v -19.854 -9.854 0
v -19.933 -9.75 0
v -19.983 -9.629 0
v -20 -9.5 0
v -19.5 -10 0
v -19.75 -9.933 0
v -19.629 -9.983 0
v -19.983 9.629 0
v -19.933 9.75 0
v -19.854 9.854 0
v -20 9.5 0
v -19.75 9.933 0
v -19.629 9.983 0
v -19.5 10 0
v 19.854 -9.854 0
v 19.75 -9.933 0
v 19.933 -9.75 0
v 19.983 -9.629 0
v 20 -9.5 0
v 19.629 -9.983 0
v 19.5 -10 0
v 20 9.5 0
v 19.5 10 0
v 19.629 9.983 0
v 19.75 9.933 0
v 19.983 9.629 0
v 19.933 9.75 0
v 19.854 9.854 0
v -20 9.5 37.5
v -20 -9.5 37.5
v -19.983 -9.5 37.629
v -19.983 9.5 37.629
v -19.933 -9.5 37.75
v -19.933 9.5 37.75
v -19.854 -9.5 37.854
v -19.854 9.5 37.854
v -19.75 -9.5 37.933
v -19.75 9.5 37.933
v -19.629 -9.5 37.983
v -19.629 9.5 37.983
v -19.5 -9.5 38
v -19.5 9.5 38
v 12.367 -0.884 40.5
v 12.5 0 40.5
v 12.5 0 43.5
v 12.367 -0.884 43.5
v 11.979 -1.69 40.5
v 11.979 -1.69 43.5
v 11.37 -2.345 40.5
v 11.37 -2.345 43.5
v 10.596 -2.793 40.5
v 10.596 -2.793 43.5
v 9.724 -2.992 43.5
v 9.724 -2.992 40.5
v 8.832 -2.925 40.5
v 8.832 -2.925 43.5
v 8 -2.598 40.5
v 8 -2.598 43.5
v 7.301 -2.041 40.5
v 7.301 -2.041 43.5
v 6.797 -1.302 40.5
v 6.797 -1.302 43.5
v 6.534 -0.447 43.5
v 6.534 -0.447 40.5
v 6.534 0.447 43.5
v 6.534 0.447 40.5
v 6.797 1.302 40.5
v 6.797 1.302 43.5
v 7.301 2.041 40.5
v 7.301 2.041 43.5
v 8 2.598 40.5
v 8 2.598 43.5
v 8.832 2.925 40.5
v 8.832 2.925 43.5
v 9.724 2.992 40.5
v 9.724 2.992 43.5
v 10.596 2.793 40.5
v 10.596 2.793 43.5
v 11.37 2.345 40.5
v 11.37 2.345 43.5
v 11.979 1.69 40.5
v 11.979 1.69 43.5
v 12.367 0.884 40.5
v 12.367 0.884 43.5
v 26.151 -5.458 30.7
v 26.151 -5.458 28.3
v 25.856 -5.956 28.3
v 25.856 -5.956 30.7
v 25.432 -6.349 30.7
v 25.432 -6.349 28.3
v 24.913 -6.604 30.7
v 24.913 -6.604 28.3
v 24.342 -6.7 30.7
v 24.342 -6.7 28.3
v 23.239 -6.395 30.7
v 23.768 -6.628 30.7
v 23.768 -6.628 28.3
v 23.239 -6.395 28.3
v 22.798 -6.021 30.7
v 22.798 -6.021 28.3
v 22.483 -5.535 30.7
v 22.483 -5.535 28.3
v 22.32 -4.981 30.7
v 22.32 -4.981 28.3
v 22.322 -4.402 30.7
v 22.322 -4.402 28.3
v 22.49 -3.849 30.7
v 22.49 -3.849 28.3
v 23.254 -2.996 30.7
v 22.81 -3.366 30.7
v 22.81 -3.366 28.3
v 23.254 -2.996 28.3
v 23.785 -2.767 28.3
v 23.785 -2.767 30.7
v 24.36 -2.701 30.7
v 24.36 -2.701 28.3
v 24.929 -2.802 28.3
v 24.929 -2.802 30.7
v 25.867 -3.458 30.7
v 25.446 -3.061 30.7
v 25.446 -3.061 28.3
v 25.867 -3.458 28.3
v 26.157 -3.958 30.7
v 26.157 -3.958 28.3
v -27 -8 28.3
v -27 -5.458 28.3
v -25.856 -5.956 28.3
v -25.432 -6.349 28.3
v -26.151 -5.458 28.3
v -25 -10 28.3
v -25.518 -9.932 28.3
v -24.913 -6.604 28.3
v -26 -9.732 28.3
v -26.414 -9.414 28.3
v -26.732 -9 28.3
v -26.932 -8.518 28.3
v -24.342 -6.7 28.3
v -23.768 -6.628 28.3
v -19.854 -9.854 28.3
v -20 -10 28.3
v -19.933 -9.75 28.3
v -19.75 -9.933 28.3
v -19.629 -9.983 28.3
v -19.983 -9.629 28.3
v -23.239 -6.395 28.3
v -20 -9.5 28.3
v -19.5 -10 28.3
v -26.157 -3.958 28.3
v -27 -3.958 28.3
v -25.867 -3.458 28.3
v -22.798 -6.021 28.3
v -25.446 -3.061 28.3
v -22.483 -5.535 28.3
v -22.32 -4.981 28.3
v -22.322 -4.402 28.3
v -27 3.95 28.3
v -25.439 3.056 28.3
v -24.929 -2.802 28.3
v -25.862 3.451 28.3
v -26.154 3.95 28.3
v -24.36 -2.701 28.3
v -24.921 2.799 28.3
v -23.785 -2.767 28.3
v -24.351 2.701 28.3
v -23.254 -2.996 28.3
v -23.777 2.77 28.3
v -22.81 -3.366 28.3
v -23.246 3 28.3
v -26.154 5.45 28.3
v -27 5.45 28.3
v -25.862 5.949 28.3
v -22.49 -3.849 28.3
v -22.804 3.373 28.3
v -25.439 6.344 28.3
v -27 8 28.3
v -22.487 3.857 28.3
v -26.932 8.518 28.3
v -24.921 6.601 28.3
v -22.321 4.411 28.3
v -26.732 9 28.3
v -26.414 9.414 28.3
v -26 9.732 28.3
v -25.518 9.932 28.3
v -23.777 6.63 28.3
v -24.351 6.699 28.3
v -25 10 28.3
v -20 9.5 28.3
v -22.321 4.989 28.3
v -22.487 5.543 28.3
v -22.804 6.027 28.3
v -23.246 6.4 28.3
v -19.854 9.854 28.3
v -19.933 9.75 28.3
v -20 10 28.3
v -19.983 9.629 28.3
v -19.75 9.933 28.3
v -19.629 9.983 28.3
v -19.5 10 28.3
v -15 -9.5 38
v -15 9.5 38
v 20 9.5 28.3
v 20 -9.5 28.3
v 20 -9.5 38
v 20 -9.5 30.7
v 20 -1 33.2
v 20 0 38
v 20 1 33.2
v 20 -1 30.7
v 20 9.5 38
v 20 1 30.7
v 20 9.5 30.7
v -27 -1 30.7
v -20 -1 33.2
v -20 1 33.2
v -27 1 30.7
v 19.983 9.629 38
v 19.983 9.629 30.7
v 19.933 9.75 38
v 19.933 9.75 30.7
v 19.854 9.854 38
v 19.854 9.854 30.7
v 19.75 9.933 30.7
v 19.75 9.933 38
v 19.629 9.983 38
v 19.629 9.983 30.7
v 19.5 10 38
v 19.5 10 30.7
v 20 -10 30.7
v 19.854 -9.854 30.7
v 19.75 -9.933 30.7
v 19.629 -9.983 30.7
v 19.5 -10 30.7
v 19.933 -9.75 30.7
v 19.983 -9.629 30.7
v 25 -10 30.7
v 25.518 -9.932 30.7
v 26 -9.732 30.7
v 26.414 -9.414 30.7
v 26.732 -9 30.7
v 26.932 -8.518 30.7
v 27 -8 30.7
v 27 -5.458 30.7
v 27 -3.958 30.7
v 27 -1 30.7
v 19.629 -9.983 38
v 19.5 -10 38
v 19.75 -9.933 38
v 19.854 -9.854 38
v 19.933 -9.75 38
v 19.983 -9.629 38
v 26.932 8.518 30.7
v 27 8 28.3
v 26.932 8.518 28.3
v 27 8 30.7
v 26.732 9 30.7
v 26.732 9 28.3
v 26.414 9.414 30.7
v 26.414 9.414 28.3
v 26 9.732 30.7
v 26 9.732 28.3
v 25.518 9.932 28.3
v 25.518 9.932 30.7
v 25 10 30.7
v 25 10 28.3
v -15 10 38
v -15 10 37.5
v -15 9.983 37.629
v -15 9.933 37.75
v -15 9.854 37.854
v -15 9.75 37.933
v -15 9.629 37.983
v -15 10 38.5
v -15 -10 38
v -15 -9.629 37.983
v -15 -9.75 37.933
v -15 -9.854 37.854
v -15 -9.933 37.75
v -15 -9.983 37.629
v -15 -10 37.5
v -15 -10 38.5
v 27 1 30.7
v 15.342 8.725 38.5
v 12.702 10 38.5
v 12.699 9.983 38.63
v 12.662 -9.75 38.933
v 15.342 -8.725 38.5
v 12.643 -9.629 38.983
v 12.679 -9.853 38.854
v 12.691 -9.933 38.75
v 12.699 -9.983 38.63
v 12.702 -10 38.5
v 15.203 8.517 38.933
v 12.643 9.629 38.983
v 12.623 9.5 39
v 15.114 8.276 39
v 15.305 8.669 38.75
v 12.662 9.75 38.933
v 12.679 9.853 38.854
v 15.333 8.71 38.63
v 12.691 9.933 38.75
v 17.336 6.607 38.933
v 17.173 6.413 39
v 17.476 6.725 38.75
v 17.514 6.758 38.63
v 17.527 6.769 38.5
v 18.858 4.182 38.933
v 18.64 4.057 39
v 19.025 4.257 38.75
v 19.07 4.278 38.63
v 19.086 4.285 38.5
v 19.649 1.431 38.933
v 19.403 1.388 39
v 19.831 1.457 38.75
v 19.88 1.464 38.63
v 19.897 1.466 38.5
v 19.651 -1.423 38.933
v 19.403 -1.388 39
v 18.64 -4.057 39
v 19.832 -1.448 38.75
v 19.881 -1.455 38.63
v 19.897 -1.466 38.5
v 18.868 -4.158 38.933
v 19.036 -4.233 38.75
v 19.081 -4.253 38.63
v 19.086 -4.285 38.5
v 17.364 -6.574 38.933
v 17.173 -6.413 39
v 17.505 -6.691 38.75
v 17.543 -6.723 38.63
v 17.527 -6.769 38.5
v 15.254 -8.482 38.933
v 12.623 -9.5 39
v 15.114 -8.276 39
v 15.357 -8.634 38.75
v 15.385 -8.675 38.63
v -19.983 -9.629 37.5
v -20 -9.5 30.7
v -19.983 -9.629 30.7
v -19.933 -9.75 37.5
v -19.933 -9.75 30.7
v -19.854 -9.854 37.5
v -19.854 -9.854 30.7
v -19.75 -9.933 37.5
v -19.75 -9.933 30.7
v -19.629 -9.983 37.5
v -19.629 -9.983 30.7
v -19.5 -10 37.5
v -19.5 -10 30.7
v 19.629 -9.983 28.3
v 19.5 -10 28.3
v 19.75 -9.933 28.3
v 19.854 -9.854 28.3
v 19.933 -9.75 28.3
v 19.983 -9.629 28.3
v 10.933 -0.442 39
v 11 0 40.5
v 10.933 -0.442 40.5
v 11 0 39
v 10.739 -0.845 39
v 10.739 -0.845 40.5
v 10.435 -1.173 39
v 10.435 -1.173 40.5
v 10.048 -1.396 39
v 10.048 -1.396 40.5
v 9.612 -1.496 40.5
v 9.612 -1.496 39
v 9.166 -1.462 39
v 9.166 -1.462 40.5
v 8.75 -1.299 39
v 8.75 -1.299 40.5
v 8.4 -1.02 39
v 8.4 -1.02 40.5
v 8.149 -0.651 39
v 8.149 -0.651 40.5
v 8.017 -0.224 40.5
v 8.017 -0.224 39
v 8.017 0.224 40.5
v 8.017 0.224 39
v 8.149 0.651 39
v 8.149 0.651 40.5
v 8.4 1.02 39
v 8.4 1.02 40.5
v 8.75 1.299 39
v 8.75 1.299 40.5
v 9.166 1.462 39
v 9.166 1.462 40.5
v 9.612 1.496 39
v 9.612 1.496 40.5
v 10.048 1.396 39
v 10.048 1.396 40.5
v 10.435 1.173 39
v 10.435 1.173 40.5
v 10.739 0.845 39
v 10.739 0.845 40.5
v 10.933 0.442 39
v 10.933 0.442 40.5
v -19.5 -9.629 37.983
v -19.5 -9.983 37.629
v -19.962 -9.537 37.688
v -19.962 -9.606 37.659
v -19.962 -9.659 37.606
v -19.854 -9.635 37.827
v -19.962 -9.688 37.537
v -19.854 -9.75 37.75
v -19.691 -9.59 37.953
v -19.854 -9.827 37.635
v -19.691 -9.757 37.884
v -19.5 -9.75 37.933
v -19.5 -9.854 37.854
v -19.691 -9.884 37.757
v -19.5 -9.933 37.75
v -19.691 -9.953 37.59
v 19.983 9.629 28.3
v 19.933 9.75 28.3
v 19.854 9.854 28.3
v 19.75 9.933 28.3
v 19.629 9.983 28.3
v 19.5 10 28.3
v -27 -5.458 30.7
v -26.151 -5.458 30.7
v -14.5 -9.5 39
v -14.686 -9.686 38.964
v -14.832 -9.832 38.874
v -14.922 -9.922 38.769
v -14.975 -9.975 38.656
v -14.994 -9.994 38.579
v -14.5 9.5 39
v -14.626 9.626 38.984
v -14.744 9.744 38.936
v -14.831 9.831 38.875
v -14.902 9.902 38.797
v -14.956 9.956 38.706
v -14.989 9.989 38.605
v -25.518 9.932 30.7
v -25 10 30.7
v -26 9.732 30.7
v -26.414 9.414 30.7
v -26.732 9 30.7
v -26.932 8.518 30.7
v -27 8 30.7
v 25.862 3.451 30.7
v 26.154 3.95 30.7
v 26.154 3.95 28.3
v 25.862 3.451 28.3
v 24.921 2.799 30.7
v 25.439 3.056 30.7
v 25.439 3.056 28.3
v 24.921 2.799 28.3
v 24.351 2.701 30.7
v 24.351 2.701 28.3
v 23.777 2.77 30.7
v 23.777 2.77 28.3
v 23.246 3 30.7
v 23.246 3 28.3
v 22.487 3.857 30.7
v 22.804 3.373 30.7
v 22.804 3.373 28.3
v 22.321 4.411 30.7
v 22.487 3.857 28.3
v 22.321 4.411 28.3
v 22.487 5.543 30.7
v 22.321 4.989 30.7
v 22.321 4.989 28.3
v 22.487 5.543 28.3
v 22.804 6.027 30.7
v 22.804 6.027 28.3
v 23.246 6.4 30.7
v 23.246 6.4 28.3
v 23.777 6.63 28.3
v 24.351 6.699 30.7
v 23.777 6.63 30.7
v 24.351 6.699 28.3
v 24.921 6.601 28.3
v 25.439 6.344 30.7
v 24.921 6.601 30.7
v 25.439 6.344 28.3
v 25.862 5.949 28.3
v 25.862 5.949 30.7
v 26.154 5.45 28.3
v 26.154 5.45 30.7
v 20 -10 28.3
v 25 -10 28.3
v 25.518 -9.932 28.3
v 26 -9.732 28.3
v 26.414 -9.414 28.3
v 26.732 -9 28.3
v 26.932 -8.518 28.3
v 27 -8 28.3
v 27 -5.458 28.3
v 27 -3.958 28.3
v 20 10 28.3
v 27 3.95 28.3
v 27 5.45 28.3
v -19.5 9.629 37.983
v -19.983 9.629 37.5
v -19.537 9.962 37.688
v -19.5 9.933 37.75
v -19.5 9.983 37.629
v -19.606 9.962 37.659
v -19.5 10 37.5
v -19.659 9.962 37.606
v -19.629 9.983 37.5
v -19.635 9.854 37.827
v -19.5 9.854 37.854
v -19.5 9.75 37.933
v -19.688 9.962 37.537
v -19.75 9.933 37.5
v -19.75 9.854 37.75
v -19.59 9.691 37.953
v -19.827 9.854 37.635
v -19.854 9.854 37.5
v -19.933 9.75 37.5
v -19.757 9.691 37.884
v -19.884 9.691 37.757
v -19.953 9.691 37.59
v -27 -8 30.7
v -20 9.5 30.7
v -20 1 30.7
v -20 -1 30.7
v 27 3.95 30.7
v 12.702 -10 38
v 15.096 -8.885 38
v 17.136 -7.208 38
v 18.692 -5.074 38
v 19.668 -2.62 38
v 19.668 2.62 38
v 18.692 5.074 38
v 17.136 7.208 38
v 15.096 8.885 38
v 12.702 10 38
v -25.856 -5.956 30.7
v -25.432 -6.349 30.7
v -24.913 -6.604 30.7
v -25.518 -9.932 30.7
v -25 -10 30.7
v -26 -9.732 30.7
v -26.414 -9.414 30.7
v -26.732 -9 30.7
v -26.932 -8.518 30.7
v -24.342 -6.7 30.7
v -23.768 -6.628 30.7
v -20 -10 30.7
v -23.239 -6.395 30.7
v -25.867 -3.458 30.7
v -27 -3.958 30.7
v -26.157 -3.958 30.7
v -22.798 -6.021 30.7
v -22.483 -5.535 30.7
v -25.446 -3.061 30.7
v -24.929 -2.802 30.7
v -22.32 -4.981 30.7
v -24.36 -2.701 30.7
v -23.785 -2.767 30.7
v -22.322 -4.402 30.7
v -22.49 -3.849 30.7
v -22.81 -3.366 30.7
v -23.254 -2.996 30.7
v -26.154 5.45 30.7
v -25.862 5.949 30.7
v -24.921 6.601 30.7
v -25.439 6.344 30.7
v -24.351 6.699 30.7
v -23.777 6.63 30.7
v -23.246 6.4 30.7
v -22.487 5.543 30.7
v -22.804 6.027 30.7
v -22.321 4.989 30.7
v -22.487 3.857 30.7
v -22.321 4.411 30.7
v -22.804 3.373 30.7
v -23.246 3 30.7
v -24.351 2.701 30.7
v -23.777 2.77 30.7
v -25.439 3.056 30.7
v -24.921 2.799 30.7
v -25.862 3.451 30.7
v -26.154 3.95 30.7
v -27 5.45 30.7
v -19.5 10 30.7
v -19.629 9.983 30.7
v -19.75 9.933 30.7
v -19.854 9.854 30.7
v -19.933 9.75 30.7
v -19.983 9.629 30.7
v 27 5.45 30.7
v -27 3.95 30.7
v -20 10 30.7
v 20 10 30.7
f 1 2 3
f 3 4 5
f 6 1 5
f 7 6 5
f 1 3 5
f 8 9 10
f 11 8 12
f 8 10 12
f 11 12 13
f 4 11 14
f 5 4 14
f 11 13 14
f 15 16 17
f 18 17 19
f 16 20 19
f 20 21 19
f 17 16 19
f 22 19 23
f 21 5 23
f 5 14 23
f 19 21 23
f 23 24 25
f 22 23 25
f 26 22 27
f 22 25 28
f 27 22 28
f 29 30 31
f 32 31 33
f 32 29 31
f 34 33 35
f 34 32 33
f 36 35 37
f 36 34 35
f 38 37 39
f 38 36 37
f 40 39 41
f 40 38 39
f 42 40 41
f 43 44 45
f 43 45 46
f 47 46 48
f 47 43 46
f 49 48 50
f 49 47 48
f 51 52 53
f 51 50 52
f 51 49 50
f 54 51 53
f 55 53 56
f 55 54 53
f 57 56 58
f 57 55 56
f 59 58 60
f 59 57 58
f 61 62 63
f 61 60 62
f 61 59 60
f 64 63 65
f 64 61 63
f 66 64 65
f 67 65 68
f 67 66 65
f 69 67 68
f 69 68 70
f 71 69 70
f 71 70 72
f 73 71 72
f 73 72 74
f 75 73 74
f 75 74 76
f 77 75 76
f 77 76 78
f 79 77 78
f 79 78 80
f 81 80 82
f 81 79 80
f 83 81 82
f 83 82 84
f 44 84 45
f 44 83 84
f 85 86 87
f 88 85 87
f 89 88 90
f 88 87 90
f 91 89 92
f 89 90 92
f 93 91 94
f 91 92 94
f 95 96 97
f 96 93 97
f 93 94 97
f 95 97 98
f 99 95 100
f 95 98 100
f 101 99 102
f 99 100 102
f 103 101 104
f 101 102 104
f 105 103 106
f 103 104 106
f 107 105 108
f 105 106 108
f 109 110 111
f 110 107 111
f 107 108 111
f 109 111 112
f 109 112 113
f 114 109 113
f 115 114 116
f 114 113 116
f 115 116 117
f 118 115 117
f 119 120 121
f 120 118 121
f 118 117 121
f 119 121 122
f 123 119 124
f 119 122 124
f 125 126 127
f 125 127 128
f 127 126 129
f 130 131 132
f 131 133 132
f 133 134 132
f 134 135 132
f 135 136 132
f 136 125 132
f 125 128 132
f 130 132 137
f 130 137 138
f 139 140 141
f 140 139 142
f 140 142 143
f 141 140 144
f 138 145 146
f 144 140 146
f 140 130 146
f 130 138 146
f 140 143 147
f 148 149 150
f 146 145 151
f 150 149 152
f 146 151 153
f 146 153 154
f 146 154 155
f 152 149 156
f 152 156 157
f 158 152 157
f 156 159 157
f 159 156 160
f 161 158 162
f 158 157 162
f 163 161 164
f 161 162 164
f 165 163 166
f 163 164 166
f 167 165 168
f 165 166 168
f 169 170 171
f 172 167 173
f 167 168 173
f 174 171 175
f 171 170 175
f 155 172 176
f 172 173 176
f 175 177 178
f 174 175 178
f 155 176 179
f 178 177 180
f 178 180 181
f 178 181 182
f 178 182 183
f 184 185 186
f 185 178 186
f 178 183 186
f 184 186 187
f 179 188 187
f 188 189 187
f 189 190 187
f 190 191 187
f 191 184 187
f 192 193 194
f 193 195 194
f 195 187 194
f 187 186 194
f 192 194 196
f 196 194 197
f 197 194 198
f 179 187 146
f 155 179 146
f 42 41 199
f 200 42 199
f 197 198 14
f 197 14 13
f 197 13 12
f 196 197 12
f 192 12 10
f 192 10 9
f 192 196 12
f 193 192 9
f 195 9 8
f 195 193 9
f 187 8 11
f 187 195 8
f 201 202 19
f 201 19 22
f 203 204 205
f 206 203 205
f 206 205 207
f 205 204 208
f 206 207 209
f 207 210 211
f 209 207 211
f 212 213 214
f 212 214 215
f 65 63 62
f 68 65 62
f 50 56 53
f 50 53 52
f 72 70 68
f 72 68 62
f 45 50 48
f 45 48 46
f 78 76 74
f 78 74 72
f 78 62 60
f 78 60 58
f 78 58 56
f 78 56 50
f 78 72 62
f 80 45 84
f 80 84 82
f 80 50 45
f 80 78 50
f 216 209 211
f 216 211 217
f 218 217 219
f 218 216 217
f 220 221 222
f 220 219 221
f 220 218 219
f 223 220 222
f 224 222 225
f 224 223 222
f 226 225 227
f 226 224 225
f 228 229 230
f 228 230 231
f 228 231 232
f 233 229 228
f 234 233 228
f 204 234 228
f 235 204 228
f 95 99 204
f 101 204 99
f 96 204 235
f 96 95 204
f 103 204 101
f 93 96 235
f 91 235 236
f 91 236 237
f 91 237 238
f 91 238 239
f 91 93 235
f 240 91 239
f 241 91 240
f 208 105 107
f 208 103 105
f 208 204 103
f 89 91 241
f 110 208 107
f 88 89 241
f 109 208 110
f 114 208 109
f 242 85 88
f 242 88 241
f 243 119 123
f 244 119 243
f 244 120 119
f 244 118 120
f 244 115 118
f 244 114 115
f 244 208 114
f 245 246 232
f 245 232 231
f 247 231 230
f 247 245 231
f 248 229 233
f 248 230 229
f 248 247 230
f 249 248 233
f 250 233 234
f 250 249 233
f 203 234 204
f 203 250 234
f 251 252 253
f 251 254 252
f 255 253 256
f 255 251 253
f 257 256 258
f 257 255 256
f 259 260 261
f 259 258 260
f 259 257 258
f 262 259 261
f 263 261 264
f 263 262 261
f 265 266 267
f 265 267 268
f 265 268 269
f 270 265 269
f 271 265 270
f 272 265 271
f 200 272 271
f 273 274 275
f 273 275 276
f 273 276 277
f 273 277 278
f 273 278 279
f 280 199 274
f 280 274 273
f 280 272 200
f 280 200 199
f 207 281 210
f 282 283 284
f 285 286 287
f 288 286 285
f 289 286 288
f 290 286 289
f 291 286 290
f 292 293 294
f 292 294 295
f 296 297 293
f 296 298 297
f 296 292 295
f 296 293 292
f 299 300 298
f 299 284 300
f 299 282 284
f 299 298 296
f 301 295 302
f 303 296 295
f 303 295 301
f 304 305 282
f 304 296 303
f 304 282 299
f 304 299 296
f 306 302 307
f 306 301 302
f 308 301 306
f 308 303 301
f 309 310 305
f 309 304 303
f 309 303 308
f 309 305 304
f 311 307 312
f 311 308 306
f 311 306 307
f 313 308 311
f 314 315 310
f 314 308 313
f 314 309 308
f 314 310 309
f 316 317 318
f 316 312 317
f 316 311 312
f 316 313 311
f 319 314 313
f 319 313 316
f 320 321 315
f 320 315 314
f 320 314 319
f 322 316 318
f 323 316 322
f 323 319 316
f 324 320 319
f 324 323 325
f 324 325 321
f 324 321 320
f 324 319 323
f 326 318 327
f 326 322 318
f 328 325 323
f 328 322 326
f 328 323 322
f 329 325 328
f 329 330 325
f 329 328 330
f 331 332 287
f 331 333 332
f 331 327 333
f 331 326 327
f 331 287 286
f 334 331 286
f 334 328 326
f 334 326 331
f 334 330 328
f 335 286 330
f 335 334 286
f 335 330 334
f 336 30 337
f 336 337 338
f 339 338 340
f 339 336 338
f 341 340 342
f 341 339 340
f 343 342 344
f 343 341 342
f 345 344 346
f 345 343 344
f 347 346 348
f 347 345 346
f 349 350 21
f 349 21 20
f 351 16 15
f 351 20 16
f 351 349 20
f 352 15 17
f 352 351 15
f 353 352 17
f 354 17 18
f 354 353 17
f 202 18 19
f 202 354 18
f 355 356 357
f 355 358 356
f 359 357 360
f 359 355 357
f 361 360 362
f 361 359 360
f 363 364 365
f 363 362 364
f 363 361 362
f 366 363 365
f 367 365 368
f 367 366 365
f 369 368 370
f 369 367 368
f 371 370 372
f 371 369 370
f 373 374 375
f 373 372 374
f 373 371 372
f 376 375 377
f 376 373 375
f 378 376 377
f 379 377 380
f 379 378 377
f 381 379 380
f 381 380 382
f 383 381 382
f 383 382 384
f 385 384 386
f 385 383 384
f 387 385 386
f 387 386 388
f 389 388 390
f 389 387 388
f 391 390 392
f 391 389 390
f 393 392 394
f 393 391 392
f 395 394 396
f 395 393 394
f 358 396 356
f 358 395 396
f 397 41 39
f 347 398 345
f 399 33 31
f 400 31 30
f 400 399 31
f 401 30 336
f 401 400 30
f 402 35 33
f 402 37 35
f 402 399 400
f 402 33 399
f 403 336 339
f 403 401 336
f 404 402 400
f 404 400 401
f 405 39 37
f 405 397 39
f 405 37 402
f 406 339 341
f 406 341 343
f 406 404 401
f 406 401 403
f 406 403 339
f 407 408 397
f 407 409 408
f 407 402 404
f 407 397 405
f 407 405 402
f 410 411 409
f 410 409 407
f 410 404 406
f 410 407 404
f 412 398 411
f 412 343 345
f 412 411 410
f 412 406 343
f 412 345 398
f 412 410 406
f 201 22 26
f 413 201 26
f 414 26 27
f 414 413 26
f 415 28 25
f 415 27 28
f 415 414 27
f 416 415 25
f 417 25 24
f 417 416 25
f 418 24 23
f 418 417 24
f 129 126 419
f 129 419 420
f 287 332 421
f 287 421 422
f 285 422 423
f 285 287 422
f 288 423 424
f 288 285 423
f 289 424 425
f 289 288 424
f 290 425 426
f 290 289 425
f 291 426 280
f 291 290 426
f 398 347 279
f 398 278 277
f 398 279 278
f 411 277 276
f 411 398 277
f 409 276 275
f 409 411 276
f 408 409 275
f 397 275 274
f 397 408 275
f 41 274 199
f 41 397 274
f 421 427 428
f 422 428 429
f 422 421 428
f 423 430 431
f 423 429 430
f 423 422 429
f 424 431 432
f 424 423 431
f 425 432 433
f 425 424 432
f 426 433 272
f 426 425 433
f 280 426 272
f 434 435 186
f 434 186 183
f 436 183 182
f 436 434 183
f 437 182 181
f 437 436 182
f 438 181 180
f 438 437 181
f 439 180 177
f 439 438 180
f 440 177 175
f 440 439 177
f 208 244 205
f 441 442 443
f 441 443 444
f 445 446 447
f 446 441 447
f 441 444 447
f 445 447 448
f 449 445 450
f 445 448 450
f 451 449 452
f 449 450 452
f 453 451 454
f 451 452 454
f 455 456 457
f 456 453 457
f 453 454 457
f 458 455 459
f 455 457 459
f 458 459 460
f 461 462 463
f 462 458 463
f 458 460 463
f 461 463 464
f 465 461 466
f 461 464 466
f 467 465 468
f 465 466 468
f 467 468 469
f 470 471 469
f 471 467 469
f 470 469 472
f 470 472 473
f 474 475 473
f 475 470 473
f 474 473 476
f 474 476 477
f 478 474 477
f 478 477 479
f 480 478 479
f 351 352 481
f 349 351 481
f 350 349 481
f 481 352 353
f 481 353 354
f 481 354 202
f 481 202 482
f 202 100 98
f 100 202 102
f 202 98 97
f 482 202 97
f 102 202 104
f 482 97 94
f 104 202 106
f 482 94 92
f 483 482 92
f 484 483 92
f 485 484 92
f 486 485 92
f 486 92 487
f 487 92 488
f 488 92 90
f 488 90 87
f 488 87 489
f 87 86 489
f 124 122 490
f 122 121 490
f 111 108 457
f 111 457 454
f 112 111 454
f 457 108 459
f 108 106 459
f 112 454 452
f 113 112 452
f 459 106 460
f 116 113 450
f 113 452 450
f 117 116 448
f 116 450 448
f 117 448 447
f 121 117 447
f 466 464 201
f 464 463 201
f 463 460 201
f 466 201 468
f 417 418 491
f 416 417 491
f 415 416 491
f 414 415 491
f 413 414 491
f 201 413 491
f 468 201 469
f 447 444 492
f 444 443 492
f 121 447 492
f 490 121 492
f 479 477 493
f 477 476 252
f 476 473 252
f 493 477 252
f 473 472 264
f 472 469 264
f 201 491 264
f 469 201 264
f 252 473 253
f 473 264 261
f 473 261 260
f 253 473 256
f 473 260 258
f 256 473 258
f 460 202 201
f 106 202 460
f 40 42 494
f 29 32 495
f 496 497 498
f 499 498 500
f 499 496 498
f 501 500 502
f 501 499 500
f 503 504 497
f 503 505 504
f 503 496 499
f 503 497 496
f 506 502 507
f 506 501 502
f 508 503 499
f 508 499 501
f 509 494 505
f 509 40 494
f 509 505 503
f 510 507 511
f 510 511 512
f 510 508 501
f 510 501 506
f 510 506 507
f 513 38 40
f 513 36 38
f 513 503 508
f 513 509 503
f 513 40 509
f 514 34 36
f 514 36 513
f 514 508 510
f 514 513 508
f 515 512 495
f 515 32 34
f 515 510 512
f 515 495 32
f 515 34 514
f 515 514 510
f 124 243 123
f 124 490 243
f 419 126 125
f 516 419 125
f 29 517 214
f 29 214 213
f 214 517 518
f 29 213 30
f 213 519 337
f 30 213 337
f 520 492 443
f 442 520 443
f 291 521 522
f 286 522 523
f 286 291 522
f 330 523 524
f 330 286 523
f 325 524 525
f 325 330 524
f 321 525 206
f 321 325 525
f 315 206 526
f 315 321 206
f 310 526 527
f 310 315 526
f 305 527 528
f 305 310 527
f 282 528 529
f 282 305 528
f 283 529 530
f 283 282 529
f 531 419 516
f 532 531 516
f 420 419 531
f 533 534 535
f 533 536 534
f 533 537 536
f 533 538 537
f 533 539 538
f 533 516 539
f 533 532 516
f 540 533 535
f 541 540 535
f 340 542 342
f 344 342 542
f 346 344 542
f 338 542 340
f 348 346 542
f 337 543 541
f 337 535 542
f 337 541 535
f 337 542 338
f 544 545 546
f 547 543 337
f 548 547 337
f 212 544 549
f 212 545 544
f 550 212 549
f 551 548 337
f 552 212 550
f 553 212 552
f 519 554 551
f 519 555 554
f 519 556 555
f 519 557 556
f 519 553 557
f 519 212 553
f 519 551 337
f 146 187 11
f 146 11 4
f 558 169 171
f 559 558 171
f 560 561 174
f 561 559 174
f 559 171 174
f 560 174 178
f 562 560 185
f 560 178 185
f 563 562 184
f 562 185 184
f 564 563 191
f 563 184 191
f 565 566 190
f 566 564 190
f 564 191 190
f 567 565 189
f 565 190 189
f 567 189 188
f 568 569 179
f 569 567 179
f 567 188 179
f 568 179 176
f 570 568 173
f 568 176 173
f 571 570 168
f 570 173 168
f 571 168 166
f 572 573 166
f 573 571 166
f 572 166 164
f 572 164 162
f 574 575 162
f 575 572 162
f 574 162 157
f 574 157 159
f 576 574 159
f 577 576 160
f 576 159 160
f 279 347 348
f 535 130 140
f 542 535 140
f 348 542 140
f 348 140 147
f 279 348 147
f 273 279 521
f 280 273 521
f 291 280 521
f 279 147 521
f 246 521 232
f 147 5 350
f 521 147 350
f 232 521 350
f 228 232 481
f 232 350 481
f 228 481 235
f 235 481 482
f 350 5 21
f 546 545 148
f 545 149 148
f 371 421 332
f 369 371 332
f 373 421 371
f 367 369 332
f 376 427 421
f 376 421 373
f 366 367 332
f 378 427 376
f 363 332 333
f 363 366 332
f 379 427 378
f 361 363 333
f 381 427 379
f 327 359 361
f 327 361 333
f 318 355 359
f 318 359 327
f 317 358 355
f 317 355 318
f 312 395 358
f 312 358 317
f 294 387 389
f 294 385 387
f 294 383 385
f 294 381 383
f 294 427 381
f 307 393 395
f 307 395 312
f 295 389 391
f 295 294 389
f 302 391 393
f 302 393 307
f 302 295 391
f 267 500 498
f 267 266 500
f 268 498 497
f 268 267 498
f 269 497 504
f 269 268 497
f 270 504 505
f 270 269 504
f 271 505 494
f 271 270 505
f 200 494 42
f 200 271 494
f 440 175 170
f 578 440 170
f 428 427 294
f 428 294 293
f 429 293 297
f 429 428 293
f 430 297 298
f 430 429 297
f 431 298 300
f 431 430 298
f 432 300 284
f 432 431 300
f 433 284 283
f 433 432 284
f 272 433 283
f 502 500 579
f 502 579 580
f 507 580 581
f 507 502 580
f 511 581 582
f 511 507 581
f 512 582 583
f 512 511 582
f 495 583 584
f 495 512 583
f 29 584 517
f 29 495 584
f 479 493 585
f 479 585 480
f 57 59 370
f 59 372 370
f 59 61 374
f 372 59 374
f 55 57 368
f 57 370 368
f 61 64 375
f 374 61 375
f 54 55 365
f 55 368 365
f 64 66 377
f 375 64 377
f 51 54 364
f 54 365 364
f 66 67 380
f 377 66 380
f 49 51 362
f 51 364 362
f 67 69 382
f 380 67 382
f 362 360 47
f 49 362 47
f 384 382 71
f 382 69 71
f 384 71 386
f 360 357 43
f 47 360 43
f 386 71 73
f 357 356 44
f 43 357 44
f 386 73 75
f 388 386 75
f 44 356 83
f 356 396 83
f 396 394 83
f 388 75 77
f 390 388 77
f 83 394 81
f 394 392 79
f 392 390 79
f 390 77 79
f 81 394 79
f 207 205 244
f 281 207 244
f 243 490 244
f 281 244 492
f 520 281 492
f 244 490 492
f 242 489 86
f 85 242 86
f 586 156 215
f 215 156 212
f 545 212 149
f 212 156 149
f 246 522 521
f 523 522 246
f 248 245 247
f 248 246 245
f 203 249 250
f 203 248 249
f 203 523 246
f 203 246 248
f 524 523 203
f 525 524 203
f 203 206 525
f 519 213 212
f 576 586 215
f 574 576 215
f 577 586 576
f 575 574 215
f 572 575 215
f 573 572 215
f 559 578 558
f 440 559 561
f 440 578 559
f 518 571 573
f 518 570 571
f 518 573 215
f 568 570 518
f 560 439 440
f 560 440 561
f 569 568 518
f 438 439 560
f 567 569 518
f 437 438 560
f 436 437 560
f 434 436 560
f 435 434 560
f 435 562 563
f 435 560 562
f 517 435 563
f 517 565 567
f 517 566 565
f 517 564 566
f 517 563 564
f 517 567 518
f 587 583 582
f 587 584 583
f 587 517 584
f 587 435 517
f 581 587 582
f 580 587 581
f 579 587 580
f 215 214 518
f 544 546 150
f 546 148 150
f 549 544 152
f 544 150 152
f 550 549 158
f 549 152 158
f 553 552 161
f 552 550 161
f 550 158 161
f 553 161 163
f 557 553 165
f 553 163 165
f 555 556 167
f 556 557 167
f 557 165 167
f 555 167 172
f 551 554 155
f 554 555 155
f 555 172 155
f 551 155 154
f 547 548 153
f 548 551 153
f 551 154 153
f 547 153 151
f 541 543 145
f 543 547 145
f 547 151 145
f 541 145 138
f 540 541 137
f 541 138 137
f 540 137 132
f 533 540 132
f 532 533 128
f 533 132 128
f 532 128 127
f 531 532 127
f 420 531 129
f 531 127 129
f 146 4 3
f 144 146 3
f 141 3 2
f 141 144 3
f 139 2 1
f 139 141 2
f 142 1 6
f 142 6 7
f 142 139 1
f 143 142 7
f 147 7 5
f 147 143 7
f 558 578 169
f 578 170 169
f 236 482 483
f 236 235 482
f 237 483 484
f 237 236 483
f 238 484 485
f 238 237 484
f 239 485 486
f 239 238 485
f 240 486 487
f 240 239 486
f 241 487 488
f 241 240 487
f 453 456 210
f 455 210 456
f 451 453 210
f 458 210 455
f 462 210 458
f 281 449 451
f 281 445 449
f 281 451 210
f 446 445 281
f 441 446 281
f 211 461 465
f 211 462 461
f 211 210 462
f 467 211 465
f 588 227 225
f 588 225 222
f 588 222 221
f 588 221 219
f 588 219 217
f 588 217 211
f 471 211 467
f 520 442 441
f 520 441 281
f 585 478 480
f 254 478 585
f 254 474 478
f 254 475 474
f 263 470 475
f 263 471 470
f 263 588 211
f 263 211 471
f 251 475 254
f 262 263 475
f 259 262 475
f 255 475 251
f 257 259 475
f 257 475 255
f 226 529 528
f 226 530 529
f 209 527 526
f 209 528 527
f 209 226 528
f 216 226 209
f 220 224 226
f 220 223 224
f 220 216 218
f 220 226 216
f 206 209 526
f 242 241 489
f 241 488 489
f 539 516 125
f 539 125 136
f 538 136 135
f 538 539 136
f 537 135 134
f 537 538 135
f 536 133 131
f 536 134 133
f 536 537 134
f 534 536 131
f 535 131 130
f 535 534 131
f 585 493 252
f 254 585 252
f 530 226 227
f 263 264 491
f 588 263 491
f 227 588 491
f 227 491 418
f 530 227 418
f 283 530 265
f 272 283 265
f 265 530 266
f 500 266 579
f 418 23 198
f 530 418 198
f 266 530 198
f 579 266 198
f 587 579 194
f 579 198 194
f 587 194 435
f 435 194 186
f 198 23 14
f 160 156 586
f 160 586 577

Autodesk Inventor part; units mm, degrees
ref_plane "YZ Plane" through (0, 0, 0) normal (1, 0, 0) x (0, 1, 0)
ref_plane "XZ Plane" through (0, 0, 0) normal (0, 1, 0) x (-1, 0, 0)
sketch "Sketch1" plane through (0, 0, 0) normal (0, 0, 1) x (1, 0, 0)
  line L0 (-20, -10) -> (20, -10)
  line L1 (20, -10) -> (20, 10)
  line L2 (20, 10) -> (-20, 10)
  line L3 (-20, 10) -> (-20, -10)
  line L4 (-20, -10) -> (20, 10) construction
  line L5 (20, -10) -> (-20, 10) construction
  point P0 (0, 0)
  dimension "d0" = 40
  dimension "d1" = 20
extrude "Extrusion1" add sketch "Sketch1" along normal blind 39
ref_plane "Work Plane1" through (0, 0, 28.3) normal (0, 0, 1) x (1, 0, 0)
sketch "Sketch2" plane through (0, 0, 28.3) normal (0, 0, 1) x (1, 0, 0)
  line L0 (20, -10) -> (-20, -10) projected
  line L1 (-20, -10) -> (-20, 10) projected
  line L2 (-20, 10) -> (20, 10) projected
  line L3 (20, 10) -> (20, -10) projected
  line L4 (-27, -10) -> (27, -10)
  line L5 (27, -10) -> (27, 10)
  line L6 (27, 10) -> (-27, 10)
  line L7 (-27, 10) -> (-27, -10)
  line L8 (-27, -10) -> (27, 10) construction
  line L9 (27, -10) -> (-27, 10) construction
  line L10 (-27, -4.7082) -> (-24.3, -4.7082) construction
  line L11 (-24.3, -4.7) -> (-24.3, 4.7) construction
  arc A0 (-26.154, 3.95) -> (-26.154, 5.45) centre (-24.3, 4.7) ccw
  arc A1 (-26.1507, -5.4582) -> (-26.1573, -3.9582) centre (-24.3, -4.7) ccw
  line L12 (0, 13.3238) -> (0, -12.3222) construction
  arc A2 (26.154, 5.45) -> (26.154, 3.95) centre (24.3, 4.7) ccw
  arc A3 (26.1573, -3.9582) -> (26.1507, -5.4582) centre (24.3, -4.7) ccw
  line L13 (-27, 3.95) -> (-27, 5.45)
  line L14 (-27, -5.4582) -> (-27, -3.9582)
  line L15 (-27, 5.45) -> (-26.154, 5.45)
  line L16 (-27, 3.95) -> (-26.154, 3.95)
  line L17 (-27, -3.9582) -> (-26.1573, -3.9582)
  line L18 (-27, -5.4582) -> (-26.1507, -5.4582)
  line L19 (27, 5.45) -> (26.154, 5.45)
  line L20 (27, 3.95) -> (26.154, 3.95)
  line L21 (27, -3.9582) -> (26.1573, -3.9582)
  line L22 (27, -5.4582) -> (26.1507, -5.4582)
  point P0 (0, 0)
  point P1 (24.3, -4.7082)
  point P2 (-27, 4.7)
  dimension "d5" = 54
  dimension "d13" = 2.7
  dimension "d14" = 9.4
  dimension "furos" = 4
  dimension "d16" = 4
  dimension "d29" = 1.5
  dimension "d30" = 1.5
extrude "Extrusion2" add sketch "Sketch2" along normal blind 2.4 contours L3 L6 L5 L19 A2 L20 L21 A3 L22 L4 | L4 L7 L18 A1 L17 L16 A0 L15 L6 L1 | L22 A3 L21 L5 | L7 L17 A1 L18 | L5 L20 A2 L19 | L15 A0 L16 L7
sketch "Sketch3" plane through (0, 0, 0) normal (0, 1, 0) x (-1, 0, 0)
  line L0 (-27, 28.3) -> (-27, 30.7) projected
  line L1 (-27, 30.7) -> (-20, 30.7) projected
  line L2 (-20, 30.7) -> (-20, 39) projected
  line L3 (-20, 39) -> (20, 39) projected
  line L4 (20, 39) -> (20, 30.7) projected
  line L5 (20, 30.7) -> (27, 30.7) projected
  line L6 (27, 30.7) -> (27, 28.3) projected
  line L7 (27, 28.3) -> (20, 28.3) projected
  line L8 (20, 28.3) -> (20, 0) projected
  line L9 (20, 0) -> (-20, 0) projected
  line L10 (-20, 0) -> (-20, 28.3) projected
  line L11 (-20, 28.3) -> (-27, 28.3) projected
  line L12 (20, 30.7) -> (20, 33.2)
  line L13 (20, 33.2) -> (27, 30.7)
  line L14 (27, 30.7) -> (20, 30.7)
  line L15 (0, 28.3) -> (0, 40.3429)
  line L16 (-20, 39) -> (-20, 30.7)
  line L17 (-20, 30.7) -> (-27, 30.7)
  line L18 (-20, 30.7) -> (-20, 33.2)
  line L19 (-20, 33.2) -> (-27, 30.7)
  line L20 (-27, 30.7) -> (-20, 30.7)
  point P0 (0, 0)
  dimension "d8" = 2.5
extrude "Extrusion4" add sketch "Sketch3" along normal mid plane 2 contours L19 L2 L1 | L13 L5 L4
extrude "Extrusion5" cut sketch "Sketch2" along normal up to surface (2.4 mm away) contours L22 A3 L21 L5 | L7 L17 A1 L18 | L5 L20 A2 L19 | L15 A0 L16 L7
sketch "Sketch4" plane through (0, 0, 39) normal (0, 0, 1) x (1, 0, 0)
  line L0 (20, 10) -> (20, -10) construction
  line L1 (20, 0) -> (9.5, 0) construction
  circle A0 centre (9.5, 0) radius 1.5
  point P0 (0, 0)
  dimension "d19" = 10.5
  dimension "d20" = 3
extrude "Extrusion6" add sketch "Sketch4" along normal blind 1.5
sketch "Sketch5" plane through (9.5, 0, 40.5) normal (0, 0, 1) x (1, 0, 0)
  circle A0 centre (0, 0) radius 3
  point P0 (-9.5, 0)
  dimension "d23" = 6
extrude "Extrusion7" add sketch "Sketch5" along normal blind 3
sketch "Sketch6" plane through (0, 0, 39) normal (0, 0, 1) x (1, 0, 0)
  circle A0 centre (9.5, 0) radius 1.5 projected
  line L0 (20, 10) -> (20, -10) projected
  line L1 (20, -10) -> (-20, -10) projected
  line L2 (-20, -10) -> (-20, 10) projected
  line L3 (-20, 10) -> (20, 10) projected
  line L4 (-20, 10) -> (-15, 10)
  line L5 (-15, 10) -> (-15, -10)
  line L6 (-15, -10) -> (-20, -10)
  line L7 (-20, -10) -> (-20, 10)
  arc A1 (12.7016, -10) -> (12.7016, 10) centre (9.5, 0) ccw
  point P0 (0, 0)
  point P1 (20, 0)
  dimension "d26" = 5
extrude "Extrusion8" cut sketch "Sketch6" against normal blind 1 contours L0 A1 L3 | L0 L1 A1 | L5 L1 L2 L3
fillet "Fillet1" radius 2 4 edges at (-27, -10, 29.5) (-27, 10, 29.5) (27, -10, 29.5) (27, 10, 29.5)
fillet "Fillet2" radius 0.5 15 edges at (-1.1492, -10, 39) (20, 0, 39) (-1.1492, 10, 39) (-15, 0, 39) (-17.5, -10, 38) (-20, 0, 38) (-17.5, 10, 38) (20, 10, 34.35) (20, -10, 34.35) (20, -10, 14.15) (20, 10, 14.15) (-20, -10, 14.15) (-20, -10, 34.35) (-20, 10, 34.35) (-20, 10, 14.15)
equation "\"d16\" = furos"
properties part number "Servo996R_180º"
